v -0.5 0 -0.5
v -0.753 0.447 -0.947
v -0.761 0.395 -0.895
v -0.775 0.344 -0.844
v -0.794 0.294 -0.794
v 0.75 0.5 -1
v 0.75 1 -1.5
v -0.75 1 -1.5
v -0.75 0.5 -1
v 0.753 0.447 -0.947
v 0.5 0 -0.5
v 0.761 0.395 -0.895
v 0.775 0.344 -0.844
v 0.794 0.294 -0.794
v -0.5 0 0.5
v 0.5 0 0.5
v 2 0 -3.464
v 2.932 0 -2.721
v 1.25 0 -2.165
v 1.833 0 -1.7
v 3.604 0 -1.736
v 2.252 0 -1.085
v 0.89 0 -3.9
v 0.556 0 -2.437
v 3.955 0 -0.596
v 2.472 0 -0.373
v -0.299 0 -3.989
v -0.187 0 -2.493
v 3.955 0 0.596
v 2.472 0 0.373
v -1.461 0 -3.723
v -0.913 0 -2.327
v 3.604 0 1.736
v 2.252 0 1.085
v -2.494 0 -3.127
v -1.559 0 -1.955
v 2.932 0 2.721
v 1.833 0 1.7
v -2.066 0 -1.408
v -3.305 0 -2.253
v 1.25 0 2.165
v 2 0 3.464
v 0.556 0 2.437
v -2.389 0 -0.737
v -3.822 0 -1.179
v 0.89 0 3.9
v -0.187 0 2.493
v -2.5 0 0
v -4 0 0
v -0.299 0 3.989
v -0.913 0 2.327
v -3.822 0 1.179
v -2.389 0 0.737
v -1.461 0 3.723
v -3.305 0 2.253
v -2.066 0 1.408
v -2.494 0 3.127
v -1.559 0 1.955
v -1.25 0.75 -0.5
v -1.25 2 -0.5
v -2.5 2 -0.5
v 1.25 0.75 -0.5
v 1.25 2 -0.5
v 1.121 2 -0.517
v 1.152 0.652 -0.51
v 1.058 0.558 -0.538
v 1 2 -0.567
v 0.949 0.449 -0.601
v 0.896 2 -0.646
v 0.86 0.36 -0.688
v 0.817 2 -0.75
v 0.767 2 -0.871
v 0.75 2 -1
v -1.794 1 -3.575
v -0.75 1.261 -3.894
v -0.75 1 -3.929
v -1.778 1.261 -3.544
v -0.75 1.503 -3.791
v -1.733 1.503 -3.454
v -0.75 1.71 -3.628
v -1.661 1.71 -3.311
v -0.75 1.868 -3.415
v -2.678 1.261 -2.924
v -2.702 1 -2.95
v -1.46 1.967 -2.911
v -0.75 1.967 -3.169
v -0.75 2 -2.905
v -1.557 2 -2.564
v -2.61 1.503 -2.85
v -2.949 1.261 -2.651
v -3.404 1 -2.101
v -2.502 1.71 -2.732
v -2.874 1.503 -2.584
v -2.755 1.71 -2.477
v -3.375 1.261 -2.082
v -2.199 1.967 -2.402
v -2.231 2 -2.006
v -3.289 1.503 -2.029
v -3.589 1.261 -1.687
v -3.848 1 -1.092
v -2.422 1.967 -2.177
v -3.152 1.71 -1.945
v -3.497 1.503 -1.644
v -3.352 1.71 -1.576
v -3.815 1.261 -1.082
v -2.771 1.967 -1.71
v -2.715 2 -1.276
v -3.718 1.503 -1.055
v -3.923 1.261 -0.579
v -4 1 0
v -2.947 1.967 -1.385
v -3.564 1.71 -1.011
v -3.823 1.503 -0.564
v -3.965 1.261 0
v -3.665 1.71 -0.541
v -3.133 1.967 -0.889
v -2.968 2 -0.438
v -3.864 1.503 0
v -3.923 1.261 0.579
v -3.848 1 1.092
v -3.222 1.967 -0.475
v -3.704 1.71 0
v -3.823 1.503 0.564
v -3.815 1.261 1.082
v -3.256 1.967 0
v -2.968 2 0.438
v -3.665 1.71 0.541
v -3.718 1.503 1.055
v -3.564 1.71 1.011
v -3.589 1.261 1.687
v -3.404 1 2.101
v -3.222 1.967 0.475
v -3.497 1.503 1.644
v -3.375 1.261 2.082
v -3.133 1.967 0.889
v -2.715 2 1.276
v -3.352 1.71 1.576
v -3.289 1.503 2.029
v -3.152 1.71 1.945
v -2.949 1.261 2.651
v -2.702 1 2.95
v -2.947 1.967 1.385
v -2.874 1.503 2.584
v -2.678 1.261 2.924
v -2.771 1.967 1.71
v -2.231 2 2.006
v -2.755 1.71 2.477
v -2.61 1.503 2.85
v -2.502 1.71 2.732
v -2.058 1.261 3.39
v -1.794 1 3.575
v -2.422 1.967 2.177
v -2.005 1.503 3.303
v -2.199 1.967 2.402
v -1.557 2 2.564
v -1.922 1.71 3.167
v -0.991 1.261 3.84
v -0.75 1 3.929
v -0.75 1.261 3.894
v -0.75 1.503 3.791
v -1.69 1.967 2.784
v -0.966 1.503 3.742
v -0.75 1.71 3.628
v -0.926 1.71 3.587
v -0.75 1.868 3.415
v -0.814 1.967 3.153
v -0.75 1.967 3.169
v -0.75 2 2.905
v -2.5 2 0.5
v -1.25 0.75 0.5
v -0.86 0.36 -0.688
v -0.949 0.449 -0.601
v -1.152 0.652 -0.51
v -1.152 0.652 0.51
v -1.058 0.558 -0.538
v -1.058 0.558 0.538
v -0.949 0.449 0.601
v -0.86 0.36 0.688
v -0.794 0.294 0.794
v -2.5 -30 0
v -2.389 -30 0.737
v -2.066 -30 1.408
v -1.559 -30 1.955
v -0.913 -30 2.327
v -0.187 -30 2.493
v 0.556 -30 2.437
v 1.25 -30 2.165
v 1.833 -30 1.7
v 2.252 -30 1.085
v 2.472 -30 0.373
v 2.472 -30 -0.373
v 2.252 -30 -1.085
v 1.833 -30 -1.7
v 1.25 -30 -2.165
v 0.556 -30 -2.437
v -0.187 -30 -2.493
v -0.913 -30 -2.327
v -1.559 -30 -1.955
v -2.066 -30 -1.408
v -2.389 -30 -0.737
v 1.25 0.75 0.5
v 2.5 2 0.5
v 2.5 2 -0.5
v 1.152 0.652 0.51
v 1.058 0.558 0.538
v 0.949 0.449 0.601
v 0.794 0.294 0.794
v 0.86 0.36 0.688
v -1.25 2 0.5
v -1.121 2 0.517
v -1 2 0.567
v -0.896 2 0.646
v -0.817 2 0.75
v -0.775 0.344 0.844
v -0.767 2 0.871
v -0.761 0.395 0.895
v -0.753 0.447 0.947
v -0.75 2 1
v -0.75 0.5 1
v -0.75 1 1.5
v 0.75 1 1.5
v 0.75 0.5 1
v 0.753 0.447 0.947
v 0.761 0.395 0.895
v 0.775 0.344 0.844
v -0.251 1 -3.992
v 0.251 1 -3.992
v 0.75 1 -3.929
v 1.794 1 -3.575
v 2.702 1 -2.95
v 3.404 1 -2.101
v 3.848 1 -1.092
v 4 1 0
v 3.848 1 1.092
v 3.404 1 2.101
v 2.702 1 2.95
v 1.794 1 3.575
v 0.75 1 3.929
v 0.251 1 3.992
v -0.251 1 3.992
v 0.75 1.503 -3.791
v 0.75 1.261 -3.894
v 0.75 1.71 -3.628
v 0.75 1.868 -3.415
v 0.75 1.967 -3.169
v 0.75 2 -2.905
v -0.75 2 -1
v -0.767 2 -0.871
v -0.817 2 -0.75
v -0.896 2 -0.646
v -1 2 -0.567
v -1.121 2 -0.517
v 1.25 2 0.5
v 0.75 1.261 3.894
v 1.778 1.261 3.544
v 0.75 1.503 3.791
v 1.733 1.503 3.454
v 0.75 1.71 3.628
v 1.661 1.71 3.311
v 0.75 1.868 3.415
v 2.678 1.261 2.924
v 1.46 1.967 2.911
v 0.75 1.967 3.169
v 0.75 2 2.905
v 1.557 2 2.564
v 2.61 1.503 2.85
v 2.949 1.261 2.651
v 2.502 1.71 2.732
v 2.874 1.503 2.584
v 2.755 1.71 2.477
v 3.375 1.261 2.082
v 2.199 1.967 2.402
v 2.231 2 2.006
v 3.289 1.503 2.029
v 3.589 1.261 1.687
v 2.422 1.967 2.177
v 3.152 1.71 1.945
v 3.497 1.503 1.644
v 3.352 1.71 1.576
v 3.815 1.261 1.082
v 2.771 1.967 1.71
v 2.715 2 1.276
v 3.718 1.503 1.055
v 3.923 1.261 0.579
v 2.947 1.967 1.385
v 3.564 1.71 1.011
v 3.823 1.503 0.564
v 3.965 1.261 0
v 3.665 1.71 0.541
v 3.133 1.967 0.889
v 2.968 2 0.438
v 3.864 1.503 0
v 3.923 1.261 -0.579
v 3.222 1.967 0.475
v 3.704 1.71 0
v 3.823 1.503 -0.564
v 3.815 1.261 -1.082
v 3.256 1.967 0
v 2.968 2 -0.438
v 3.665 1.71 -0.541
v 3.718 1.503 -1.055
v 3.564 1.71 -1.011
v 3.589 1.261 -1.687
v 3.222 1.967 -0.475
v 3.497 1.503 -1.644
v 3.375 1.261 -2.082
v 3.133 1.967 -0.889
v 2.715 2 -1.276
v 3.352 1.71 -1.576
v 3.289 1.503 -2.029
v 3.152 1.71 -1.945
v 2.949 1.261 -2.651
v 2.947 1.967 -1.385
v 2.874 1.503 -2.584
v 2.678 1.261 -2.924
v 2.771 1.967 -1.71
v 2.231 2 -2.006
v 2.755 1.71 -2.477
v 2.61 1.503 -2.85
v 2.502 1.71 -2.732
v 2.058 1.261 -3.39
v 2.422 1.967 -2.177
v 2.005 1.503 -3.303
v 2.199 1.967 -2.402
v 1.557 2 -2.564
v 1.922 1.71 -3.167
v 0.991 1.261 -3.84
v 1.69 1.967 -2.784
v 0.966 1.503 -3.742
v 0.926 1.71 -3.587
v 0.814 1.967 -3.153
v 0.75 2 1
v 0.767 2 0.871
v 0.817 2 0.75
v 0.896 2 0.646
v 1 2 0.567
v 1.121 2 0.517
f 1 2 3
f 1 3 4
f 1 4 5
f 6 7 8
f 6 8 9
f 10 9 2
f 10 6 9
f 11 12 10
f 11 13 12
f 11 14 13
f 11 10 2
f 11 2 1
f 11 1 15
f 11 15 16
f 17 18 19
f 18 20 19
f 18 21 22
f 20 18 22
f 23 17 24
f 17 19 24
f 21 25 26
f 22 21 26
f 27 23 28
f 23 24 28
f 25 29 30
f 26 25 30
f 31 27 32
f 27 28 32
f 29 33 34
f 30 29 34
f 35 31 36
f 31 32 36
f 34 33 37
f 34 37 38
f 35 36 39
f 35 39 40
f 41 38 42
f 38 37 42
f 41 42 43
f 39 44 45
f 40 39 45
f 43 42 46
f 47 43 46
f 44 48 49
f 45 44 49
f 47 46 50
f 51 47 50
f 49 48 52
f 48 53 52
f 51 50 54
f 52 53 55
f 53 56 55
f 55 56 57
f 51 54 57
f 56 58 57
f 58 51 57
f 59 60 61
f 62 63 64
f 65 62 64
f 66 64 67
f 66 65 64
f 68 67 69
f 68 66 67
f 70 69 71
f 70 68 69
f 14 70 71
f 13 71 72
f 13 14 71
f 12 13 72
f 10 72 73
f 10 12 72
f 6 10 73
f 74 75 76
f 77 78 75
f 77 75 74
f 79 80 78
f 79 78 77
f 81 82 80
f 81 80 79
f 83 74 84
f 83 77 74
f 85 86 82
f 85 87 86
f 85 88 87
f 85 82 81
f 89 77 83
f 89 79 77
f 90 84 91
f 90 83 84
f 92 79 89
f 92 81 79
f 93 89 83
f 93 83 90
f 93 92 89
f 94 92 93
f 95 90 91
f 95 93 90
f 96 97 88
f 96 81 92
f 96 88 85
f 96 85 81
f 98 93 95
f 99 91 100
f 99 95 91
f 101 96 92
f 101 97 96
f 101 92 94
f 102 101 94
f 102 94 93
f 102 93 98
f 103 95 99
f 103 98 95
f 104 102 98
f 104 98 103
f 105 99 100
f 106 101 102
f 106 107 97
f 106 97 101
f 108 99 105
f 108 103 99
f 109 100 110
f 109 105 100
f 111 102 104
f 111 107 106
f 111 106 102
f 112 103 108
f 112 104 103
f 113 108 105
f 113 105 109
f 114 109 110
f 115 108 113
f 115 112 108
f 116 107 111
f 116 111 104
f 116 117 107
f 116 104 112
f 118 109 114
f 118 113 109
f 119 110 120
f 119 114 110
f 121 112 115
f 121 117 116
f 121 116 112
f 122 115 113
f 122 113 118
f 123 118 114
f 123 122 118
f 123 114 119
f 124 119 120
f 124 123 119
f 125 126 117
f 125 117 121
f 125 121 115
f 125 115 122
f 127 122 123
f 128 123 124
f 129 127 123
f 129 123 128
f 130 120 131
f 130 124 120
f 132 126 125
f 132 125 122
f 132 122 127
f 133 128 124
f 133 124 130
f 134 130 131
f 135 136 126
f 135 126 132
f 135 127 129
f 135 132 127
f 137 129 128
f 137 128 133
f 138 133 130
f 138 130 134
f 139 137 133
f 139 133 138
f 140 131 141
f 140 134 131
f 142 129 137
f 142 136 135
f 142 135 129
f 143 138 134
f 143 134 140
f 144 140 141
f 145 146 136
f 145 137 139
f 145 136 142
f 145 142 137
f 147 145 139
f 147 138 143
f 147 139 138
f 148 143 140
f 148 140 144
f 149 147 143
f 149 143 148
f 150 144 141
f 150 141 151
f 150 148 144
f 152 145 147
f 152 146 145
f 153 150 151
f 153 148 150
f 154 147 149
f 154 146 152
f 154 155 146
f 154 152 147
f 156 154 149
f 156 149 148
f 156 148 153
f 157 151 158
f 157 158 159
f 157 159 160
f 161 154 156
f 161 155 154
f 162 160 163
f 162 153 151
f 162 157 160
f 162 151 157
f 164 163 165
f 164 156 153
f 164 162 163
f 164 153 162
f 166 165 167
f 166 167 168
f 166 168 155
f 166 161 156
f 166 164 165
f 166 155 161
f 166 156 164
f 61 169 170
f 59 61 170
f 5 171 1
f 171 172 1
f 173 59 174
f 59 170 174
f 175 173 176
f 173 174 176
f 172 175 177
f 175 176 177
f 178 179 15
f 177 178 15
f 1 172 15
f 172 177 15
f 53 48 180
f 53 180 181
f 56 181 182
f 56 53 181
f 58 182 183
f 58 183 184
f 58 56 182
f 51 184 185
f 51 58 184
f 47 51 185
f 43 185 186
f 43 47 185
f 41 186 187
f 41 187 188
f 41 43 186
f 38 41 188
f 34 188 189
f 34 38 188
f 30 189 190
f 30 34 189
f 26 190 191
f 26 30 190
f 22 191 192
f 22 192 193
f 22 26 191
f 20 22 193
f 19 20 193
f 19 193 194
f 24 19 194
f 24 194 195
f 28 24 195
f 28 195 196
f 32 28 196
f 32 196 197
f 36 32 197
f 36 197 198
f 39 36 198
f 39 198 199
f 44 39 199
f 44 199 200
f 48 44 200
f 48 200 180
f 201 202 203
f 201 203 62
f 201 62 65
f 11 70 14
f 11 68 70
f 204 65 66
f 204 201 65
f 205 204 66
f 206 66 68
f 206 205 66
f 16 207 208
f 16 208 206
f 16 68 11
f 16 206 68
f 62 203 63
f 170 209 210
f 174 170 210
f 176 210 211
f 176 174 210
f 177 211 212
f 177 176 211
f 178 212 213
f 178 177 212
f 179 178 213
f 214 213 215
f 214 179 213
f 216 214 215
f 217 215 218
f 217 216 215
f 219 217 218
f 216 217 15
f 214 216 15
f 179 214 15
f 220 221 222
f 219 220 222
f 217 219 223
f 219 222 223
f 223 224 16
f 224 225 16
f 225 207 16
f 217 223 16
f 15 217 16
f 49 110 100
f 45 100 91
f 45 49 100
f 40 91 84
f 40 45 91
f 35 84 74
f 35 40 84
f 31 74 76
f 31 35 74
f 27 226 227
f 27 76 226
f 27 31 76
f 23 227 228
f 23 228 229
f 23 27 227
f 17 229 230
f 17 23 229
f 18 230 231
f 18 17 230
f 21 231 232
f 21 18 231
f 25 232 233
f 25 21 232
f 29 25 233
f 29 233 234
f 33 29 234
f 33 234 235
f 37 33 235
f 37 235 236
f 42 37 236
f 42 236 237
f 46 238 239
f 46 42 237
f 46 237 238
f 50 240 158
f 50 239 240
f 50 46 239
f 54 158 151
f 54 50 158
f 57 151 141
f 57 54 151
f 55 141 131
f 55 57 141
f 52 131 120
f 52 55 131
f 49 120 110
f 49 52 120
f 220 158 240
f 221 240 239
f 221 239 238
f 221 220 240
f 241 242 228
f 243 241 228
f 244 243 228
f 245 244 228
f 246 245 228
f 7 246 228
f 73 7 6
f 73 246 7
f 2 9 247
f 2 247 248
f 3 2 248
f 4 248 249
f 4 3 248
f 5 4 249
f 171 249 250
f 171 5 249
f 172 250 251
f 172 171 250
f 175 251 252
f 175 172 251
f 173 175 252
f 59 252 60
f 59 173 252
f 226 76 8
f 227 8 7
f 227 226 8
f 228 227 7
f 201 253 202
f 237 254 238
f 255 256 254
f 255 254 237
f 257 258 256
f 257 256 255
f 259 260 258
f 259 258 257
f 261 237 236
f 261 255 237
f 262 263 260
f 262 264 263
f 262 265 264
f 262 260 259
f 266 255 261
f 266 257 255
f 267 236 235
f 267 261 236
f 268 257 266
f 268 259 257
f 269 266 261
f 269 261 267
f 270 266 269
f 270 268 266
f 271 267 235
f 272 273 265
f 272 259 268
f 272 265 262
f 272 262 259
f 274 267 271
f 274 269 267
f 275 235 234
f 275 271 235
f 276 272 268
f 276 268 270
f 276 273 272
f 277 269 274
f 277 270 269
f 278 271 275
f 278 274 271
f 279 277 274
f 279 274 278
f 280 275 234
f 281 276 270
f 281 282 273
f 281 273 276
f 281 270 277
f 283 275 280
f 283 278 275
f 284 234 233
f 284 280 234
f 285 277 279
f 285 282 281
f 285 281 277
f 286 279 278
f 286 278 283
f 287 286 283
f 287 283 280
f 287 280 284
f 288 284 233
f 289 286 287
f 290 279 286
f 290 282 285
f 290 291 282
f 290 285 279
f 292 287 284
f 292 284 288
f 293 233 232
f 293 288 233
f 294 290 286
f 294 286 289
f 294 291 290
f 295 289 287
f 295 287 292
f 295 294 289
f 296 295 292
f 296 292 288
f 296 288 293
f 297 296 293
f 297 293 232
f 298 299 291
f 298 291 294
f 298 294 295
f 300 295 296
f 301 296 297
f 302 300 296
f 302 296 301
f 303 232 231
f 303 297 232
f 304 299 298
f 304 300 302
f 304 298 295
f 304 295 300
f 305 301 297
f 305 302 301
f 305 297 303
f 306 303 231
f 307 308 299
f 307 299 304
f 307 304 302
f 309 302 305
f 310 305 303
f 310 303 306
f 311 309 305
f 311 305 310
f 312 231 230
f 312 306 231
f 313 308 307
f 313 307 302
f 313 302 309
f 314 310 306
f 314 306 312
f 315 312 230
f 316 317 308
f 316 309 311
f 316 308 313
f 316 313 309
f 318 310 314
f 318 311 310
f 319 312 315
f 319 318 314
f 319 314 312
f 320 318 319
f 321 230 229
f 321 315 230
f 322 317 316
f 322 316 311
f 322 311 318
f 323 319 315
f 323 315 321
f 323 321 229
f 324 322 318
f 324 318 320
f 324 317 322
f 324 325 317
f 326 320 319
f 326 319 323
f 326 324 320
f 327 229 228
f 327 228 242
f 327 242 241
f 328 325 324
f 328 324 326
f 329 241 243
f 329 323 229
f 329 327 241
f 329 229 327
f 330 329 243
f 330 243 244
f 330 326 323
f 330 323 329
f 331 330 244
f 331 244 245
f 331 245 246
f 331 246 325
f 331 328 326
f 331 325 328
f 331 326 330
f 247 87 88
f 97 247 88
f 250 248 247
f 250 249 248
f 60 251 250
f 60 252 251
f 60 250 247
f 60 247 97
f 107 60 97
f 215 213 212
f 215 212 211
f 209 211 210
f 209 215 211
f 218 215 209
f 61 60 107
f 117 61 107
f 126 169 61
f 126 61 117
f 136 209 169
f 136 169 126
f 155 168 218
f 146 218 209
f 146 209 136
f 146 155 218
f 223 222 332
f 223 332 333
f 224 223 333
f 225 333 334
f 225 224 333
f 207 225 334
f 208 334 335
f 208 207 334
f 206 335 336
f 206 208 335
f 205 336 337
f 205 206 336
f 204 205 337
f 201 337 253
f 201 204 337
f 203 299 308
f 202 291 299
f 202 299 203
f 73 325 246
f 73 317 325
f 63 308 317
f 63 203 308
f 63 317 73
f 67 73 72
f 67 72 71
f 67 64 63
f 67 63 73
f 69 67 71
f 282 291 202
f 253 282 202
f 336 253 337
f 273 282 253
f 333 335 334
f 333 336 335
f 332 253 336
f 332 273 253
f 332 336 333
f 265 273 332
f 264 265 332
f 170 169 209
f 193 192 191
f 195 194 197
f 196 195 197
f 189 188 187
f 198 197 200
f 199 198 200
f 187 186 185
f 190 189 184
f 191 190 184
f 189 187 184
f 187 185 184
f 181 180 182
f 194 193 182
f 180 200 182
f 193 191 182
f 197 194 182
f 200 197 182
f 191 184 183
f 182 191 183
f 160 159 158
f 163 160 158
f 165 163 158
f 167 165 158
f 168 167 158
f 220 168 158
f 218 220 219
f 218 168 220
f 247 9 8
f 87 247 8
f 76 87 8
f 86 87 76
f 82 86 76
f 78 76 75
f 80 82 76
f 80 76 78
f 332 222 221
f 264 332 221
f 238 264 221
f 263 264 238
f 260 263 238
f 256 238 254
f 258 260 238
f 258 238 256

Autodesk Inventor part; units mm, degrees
ref_plane "YZ Plane" through (0, 0, 0) normal (1, 0, 0) x (0, 1, 0)
ref_plane "XZ Plane" through (0, 0, 0) normal (0, 1, 0) x (-1, 0, 0)
ref_plane "XY Plane" through (0, 0, 0) normal (0, 0, 1) x (1, 0, 0)
sketch "Sketch1" plane through (0, 0, 0) normal (0, 1, 0) x (-1, 0, 0)
  circle A0 centre (0, 0) radius 2.5
  circle A1 centre (0, 0) radius 4
  dimension "d228" = 5
  dimension "d229" = 8
extrude "Extrusion1" add sketch "Sketch1" against normal blind 30 contours A0
extrude "Extrusion2" add sketch "Sketch1" along normal blind 2 contours A0 | A1
fillet "Fillet1" radius 0.5 1 edges at (4, 2, 0)
sketch "Sketch2" plane through (0, 2, 0) normal (0, 1, 0) x (1, 0, 0)
  line L0 (0.75, -4) -> (-0.75, -4)
  line L1 (-0.75, -4) -> (-0.75, 4)
  line L2 (-0.75, 4) -> (0.75, 4)
  line L3 (0.75, 4) -> (0.75, -4)
  circle A0 centre (0, 0) radius 4 projected
  line L4 (0, -4) -> (0, 4)
  line L5 (-2.5, -0.5) -> (2.5, -0.5)
  line L6 (2.5, -0.5) -> (2.5, 0.5)
  line L7 (2.5, 0.5) -> (-2.5, 0.5)
  line L8 (-2.5, 0.5) -> (-2.5, -0.5)
  line L9 (-4, 0) -> (4, 0)
  line L10 (-0.75, -2.5) -> (0.75, -2.5)
  line L11 (0.75, -2.5) -> (0.75, 2.5)
  line L12 (0.75, 2.5) -> (-0.75, 2.5)
  line L13 (-0.75, 2.5) -> (-0.75, -2.5)
  line L14 (-0.5, 0.5) -> (0.5, 0.5)
  line L15 (0.5, 0.5) -> (0.5, -0.5)
  line L16 (0.5, -0.5) -> (-0.5, -0.5)
  line L17 (-0.5, -0.5) -> (-0.5, 0.5)
  point P0 (-0.75, -3.9291)
  point P1 (0.75, -3.9291)
  point P2 (0.75, 3.9291)
  point P3 (-0.75, 3.9291)
  point P4 (0.75, 0.5)
  point P5 (-0.75, 0.5)
  point P6 (-0.75, -0.5)
  point P7 (0.75, -0.5)
  dimension "d234" = 8
  dimension "d235" = 1.5
  dimension "d236" = 1
  dimension "d237" = 5
  dimension "d238" = 5
  dimension "d243" = 1
  dimension "d244" = 1
extrude "Extrusion3" cut sketch "Sketch2" against normal blind 2 contours L5 L17 L9 L4 | L4 L9 L15 L5 | L9 L17 L7 L4 | L4 L7 L15 L9
chamfer "Chamfer1" distance 2 angle 45 4 edges at (-0.5, 2, 0) (0.5, 2, 0) (0, 2, 0.5) (0, 2, -0.5)
extrude "Extrusion4" cut sketch "Sketch2" against normal blind 1 contours L4 L10 L3 A0 | A0 L1 L10 L4 | L10 L1 L5 L4 | L4 L5 L3 L10 | L3 L12 L4 A0 | A0 L4 L12 L1 | L3 L7 L4 L12 | L12 L4 L7 L1
extrude "Extrusion5" add sketch "Sketch2" against normal blind 2 contours L3 L5 L6 L9 A0 | A0 L9 L8 L5 L1 | L9 L6 L7 L3 A0 | A0 L1 L7 L8 L9
thread "Thread1" size "M5x0.8" class "6g" standard "ANSI Metric M Profile" full length
fillet "Fillet2" radius 1 2 edges at (4, 2, 0) (-4, 2, 0)
fillet "Fillet3" radius 0.5 4 edges at (-0.75, 1.125, -0.5) (0.75, 1.125, -0.5) (-0.75, 1.125, 0.5) (0.75, 1.125, 0.5)
properties part number "Langbektang houder" material "Steel, Mild"
